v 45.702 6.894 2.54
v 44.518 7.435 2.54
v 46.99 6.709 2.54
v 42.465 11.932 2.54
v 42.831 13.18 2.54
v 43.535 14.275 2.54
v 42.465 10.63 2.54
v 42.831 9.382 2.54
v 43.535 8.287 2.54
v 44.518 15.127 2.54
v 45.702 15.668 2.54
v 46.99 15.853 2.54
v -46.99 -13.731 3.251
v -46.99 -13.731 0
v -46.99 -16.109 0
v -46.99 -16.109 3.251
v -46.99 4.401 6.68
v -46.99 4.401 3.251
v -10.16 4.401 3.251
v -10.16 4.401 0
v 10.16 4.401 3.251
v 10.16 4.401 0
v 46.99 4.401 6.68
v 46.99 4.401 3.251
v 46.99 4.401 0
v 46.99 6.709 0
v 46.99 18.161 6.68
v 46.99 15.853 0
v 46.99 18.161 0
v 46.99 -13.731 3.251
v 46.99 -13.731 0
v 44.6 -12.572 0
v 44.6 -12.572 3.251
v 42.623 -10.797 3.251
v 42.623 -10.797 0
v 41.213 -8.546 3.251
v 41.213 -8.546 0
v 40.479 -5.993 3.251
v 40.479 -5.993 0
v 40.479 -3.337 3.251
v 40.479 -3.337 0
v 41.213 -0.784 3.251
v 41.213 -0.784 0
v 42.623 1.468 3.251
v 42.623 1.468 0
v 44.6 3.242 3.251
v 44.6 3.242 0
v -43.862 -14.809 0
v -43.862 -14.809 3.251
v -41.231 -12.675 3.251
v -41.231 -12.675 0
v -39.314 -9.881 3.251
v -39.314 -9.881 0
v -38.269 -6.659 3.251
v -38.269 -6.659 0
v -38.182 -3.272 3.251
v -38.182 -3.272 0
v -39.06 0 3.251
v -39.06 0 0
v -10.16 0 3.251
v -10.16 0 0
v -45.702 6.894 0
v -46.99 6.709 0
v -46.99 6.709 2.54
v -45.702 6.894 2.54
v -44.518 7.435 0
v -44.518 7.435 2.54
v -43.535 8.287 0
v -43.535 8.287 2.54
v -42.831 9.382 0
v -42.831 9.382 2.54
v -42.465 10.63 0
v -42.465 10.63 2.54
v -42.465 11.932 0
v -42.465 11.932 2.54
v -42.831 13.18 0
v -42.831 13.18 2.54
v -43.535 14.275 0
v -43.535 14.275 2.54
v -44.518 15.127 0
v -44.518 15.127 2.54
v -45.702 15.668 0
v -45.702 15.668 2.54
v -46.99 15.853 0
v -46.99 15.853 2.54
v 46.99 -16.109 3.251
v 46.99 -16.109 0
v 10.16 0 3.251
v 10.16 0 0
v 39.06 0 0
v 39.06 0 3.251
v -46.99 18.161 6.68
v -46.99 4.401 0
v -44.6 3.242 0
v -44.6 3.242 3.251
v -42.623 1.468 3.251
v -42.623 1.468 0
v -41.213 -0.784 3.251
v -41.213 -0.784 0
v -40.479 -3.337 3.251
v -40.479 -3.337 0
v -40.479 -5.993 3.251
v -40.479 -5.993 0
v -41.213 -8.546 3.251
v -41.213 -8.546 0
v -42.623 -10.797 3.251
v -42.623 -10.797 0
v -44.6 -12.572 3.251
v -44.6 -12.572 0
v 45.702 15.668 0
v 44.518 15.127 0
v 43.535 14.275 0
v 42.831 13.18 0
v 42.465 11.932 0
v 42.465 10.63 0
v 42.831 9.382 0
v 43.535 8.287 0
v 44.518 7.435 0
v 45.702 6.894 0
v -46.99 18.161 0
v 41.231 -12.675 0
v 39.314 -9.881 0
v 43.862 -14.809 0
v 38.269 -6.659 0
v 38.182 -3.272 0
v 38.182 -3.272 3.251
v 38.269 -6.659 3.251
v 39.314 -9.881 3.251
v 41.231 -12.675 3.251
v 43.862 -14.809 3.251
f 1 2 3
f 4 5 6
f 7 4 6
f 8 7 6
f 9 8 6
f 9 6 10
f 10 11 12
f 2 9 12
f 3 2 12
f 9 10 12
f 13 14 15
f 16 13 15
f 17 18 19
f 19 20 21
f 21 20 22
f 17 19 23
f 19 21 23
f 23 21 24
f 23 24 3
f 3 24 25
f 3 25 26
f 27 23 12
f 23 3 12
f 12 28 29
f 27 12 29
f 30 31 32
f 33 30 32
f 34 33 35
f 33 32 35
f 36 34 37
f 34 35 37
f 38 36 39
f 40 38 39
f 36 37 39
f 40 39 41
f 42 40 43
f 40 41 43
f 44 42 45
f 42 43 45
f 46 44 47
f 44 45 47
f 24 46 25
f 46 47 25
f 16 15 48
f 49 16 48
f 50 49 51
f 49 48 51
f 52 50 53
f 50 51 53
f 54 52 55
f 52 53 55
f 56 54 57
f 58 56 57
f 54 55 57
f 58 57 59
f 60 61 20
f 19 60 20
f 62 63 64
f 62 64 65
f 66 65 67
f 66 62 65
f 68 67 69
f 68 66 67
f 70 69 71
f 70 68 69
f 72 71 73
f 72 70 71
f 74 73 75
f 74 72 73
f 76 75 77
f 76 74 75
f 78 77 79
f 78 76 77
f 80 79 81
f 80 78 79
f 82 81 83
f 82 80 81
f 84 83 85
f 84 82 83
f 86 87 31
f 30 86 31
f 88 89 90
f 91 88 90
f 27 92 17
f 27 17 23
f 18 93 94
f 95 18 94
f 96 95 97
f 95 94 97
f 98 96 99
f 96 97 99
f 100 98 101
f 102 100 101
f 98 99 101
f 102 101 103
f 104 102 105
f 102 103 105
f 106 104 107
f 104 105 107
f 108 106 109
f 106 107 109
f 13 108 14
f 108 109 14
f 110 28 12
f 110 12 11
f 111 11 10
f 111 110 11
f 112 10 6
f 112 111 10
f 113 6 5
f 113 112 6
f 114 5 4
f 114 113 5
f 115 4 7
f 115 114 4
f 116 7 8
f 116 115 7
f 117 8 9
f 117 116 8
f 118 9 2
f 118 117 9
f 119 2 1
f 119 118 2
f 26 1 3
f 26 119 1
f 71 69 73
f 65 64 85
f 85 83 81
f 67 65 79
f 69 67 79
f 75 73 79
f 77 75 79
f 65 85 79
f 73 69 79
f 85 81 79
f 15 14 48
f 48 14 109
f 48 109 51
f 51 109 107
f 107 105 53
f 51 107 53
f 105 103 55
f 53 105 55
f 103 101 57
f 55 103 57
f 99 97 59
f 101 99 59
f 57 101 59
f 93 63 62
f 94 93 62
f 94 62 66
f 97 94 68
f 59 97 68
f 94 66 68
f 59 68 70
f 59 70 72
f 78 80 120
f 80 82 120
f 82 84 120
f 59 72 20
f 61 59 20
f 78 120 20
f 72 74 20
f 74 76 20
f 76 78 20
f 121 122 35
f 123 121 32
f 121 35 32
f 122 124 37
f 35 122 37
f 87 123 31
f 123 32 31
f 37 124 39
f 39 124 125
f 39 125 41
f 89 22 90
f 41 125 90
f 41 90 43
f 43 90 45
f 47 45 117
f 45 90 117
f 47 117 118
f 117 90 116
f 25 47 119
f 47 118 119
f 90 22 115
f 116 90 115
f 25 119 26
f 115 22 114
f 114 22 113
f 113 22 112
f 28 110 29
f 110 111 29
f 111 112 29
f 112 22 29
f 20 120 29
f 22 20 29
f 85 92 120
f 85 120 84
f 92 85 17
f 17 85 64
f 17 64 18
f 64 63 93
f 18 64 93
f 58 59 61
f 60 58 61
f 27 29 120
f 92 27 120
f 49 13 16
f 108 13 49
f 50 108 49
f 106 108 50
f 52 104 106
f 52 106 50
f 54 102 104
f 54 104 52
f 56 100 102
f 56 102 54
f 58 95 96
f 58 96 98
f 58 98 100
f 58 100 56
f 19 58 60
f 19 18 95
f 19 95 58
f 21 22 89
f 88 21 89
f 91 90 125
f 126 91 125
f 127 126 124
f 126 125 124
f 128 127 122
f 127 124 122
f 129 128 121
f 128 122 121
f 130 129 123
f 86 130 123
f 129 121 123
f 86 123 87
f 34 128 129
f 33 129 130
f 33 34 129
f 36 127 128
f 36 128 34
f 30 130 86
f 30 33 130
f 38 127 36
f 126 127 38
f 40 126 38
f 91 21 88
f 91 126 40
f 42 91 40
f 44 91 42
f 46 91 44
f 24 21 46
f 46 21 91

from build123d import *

# Parameters (mm, degrees)
F1_DEPTH = 6.6802
F2_DEPTH = 3.2512
F4_DEPTH = 2.54


with BuildPart() as f1:
    # F0 (on Top) → F1 (new body)
    with BuildSketch(Plane.XY):
        Polygon((46.99, 18.161), (-46.99, 18.161), (-46.99, 4.401166), (-10.16, 4.401166), (10.16, 4.401166), (46.99, 4.401166), align=None)
    extrude(amount=F1_DEPTH)

    # F0 (on Top) → F2 (join)
    with BuildSketch(Plane.XY):
        with BuildLine():
            Line((-10.16, 4.401166), (-46.99, 4.401166))
            ThreePointArc((-46.99, 4.401166), (-40.386, -4.664891), (-46.99, -13.730948))
            Line((-46.99, -13.730948), (-46.99, -16.108993))
            ThreePointArc((-46.99, -16.108993), (-39.314297, -9.881174), (-39.060262, 0))
            Line((-39.060262, 0), (-10.16, 0))
            Line((-10.16, 0), (-10.16, 4.401166))
        make_face()
        with BuildLine():
            ThreePointArc((46.99, -13.730948), (40.386, -4.664891), (46.99, 4.401166))
            Line((46.99, 4.401166), (10.16, 4.401166))
            Line((10.16, 4.401166), (10.16, 0))
            Line((10.16, 0), (39.060262, 0))
            ThreePointArc((39.060262, 0), (39.314297, -9.881174), (46.99, -16.108993))
            Line((46.99, -16.108993), (46.99, -13.730948))
        make_face()
    extrude(amount=F2_DEPTH)

    # F3 (on face) → F4 (cut)
    with BuildSketch(Plane.XY):
        with BuildLine():
            Line((-46.99, 15.853083), (-46.99, 6.709083))
            ThreePointArc((-46.99, 6.709083), (-42.418, 11.281083), (-46.99, 15.853083))
        make_face()
        with BuildLine():
            ThreePointArc((46.99, 15.853083), (42.418, 11.281083), (46.99, 6.709083))
            Line((46.99, 6.709083), (46.99, 15.853083))
        make_face()
    extrude(amount=F4_DEPTH, mode=Mode.SUBTRACT)


solid = f1.part
